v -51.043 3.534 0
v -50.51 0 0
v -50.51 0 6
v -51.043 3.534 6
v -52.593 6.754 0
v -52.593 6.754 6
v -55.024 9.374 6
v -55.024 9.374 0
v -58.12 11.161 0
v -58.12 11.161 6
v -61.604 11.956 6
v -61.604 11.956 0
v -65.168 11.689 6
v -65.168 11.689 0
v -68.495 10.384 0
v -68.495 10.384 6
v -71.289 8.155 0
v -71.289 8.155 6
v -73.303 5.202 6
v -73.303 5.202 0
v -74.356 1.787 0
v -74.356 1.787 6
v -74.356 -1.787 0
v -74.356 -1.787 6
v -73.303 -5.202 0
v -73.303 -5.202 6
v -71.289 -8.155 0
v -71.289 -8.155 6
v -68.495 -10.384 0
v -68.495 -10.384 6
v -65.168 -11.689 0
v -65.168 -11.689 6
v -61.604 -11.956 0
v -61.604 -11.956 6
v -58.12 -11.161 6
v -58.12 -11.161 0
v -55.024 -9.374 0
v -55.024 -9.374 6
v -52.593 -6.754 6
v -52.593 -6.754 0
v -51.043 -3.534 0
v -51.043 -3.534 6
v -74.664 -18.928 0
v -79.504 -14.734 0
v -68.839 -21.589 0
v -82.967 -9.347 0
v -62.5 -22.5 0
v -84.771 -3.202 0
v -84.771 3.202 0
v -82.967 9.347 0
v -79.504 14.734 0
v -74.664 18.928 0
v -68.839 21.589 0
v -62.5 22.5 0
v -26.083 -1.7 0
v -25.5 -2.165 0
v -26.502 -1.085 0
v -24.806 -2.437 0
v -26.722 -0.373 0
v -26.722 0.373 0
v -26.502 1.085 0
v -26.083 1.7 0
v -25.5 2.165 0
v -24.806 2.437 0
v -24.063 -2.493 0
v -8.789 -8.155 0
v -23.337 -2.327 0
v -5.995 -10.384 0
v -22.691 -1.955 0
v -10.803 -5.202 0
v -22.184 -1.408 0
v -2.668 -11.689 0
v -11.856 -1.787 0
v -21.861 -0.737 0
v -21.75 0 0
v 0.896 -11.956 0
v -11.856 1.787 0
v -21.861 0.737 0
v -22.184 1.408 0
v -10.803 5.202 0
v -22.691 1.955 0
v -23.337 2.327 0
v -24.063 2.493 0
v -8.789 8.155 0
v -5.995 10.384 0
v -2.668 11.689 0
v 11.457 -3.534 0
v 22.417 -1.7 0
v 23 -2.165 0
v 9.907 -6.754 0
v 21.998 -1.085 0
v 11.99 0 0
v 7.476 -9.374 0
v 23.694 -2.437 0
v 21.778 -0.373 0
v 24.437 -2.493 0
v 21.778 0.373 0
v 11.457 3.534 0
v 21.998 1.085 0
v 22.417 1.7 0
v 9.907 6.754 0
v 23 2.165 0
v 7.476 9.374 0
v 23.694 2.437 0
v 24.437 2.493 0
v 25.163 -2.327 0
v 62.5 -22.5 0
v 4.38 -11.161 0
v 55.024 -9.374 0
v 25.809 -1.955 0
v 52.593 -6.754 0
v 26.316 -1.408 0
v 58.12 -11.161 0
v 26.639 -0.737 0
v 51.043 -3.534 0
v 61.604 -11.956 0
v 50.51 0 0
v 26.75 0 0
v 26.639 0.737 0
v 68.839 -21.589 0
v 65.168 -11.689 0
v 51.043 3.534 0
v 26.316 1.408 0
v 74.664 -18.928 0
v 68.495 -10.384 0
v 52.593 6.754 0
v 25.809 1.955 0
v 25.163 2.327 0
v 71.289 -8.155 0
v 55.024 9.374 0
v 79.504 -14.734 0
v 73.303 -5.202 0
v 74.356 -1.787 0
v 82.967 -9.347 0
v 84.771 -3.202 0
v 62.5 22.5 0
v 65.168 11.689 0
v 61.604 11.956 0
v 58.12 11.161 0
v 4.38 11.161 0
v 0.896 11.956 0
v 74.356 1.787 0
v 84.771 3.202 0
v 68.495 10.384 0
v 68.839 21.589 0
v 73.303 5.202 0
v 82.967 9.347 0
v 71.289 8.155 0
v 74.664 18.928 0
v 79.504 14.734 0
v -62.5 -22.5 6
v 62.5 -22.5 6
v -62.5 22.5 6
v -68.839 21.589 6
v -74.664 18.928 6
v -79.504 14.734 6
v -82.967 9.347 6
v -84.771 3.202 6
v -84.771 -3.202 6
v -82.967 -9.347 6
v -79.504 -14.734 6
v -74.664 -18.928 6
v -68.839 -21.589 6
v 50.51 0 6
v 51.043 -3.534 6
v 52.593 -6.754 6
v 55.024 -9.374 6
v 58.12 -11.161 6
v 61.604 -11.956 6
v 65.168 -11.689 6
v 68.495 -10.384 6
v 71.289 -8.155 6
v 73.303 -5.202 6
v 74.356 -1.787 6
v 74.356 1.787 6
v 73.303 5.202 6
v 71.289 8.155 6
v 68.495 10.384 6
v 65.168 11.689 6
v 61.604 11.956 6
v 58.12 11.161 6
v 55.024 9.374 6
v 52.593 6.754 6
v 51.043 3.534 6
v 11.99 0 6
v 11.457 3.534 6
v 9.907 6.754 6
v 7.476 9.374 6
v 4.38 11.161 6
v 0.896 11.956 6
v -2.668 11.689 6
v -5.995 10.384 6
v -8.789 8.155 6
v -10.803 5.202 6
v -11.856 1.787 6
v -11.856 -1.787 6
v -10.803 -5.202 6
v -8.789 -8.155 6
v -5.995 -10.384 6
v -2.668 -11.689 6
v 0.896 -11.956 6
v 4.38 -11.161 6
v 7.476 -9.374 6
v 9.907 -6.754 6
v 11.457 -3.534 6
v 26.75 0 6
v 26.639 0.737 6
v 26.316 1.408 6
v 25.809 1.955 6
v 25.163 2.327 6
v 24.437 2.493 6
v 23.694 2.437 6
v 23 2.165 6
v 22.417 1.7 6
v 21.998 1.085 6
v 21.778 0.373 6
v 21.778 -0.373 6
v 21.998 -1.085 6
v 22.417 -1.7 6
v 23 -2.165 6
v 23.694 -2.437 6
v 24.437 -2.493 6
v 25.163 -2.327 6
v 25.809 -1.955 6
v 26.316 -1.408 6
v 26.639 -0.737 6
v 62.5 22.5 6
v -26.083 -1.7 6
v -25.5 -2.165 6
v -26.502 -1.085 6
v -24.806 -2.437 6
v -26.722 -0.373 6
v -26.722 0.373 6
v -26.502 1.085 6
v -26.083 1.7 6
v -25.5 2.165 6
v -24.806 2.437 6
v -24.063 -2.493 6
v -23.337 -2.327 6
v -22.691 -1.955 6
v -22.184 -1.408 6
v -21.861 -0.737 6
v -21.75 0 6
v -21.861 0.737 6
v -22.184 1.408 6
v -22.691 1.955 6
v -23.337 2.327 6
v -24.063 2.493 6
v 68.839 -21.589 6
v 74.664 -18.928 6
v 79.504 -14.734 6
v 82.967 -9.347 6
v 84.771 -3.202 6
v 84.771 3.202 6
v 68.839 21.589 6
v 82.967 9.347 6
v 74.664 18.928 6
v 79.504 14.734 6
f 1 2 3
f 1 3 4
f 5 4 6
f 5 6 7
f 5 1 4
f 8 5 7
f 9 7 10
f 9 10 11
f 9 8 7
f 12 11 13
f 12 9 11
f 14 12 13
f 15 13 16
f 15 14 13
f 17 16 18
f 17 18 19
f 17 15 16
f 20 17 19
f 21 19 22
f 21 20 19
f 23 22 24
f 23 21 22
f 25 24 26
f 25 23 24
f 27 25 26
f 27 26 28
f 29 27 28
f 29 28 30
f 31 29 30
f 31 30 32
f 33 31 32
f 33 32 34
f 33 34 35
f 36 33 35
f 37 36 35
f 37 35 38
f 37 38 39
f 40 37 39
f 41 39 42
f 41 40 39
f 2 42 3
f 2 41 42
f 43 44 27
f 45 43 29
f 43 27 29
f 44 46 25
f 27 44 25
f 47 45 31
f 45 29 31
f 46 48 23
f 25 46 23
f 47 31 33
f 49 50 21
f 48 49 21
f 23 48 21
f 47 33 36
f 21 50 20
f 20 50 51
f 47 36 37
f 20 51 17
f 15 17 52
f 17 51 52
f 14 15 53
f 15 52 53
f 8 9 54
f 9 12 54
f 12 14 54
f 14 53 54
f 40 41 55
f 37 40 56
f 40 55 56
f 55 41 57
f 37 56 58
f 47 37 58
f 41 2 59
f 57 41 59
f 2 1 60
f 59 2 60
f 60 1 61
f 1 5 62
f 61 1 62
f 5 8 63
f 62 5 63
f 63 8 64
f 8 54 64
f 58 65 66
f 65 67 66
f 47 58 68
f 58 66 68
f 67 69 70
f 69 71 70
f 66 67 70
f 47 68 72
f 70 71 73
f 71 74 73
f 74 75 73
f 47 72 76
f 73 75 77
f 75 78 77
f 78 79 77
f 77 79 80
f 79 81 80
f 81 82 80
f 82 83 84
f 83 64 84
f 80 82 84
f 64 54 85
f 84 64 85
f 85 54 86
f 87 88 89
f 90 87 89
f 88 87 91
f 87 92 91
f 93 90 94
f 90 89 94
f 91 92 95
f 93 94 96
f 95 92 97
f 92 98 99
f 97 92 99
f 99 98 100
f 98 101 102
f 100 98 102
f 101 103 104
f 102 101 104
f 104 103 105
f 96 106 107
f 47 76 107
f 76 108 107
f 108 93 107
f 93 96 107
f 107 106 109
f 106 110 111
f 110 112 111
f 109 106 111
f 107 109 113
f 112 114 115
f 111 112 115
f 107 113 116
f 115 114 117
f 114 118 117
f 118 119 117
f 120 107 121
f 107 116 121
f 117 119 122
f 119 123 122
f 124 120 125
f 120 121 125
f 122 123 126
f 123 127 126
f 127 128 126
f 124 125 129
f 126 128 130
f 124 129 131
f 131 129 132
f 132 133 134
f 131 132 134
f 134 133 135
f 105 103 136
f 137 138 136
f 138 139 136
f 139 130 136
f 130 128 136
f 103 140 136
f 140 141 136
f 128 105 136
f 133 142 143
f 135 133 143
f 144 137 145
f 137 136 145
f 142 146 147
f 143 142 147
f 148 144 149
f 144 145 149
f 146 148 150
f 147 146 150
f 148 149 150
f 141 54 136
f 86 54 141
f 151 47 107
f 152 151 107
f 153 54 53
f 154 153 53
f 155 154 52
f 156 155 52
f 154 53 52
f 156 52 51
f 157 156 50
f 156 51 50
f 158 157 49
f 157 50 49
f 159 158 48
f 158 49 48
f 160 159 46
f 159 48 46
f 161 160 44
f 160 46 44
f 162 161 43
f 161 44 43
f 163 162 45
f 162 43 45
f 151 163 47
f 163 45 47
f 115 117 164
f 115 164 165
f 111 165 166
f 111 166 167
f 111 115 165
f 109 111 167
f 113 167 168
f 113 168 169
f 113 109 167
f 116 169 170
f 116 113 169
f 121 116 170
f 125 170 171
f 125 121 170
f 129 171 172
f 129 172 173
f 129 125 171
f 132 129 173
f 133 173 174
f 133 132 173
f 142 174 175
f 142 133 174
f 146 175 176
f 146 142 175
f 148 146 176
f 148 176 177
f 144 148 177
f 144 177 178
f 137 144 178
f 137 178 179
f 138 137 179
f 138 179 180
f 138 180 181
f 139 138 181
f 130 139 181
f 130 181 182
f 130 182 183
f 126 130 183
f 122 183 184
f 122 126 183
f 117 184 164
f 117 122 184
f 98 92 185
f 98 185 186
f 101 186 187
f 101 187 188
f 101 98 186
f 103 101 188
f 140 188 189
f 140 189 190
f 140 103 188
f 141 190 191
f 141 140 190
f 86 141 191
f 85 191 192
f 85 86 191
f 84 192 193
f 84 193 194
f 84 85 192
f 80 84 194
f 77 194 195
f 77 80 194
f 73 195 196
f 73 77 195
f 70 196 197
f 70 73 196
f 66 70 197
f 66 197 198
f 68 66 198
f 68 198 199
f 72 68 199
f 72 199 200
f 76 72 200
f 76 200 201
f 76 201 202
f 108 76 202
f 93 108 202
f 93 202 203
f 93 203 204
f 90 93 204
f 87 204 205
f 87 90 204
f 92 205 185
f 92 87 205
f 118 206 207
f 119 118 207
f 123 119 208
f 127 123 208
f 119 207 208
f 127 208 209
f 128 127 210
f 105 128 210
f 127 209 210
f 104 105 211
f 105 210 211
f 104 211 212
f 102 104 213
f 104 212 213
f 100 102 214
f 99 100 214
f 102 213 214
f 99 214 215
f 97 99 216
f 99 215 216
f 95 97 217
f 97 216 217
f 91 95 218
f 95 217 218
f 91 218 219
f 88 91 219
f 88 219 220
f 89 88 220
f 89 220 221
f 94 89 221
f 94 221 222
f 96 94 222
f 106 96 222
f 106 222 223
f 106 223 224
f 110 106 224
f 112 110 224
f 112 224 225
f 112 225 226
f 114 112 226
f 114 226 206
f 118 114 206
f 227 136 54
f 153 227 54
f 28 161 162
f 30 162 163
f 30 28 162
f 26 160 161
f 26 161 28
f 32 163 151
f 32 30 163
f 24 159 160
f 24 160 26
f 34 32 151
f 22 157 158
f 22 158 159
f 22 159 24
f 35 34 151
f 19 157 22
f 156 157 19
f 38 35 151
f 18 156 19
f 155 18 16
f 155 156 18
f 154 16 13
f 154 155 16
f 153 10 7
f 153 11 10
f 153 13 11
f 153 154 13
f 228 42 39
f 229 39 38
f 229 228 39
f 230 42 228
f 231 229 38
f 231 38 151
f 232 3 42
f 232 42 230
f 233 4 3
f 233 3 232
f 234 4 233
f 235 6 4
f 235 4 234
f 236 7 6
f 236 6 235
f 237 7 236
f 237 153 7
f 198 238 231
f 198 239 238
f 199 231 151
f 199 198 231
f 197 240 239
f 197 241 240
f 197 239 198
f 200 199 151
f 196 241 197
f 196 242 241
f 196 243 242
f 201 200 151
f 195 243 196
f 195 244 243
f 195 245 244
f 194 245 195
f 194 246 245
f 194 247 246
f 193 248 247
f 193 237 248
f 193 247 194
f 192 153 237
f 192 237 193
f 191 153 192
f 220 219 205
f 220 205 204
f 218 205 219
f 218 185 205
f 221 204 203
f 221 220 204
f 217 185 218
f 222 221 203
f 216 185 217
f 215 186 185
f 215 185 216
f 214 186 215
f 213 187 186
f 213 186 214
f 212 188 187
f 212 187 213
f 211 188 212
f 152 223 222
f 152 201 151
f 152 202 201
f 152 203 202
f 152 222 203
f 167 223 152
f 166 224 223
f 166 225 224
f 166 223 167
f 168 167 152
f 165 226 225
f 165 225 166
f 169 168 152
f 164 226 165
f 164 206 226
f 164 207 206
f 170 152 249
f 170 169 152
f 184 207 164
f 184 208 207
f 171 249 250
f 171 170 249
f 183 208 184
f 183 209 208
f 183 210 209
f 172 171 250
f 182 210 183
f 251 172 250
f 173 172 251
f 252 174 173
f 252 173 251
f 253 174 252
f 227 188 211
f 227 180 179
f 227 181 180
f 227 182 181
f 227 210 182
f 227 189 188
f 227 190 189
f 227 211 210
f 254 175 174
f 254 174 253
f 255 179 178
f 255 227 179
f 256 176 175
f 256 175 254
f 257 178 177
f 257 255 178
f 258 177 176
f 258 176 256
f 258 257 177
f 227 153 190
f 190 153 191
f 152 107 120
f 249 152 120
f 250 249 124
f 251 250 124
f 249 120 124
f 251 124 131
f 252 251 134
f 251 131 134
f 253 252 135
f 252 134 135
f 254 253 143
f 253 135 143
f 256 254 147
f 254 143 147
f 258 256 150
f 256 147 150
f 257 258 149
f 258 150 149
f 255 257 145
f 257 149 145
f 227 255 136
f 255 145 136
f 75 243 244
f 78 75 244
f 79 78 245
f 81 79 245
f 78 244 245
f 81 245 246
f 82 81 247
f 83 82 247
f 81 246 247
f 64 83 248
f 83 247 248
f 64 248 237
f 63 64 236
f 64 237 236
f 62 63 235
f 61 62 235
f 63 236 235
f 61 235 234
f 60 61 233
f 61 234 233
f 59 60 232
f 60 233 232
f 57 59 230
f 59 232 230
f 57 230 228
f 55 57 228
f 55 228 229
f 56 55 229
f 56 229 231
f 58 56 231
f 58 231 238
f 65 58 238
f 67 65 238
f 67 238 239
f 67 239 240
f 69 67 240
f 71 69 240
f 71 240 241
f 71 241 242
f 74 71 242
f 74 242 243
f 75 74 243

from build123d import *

# Parameters (mm, degrees)
SKETCH2_R           = 11.99
BOSS_EXTRUDE1_DEPTH = 6
SKETCH3_R           = 2.5
CUT_EXTRUDE1_DEPTH  = 10


with BuildPart() as part:
    # Sketch2 → Boss-Extrude1 (new body)
    with BuildSketch(Plane.XY):
        with BuildLine():
            Line((-62.5, -22.5), (62.5, -22.5))
            ThreePointArc((62.5, -22.5), (85, 0), (62.5, 22.5))
            Line((62.5, 22.5), (-62.5, 22.5))
            ThreePointArc((-62.5, 22.5), (-85, 0), (-62.5, -22.5))
        make_face()
        with Locations((-62.5, 0)):
            Circle(SKETCH2_R, mode=Mode.SUBTRACT)
        with Locations(Location((62.5, 0, 0), (0, 0, 180))):
            Circle(SKETCH2_R, mode=Mode.SUBTRACT)
        Circle(SKETCH2_R, mode=Mode.SUBTRACT)
    extrude(amount=BOSS_EXTRUDE1_DEPTH)

    # Sketch3 → Cut-Extrude1 (cut)
    with BuildSketch(Plane.XY.offset(6)):
        with Locations((-24.25, 0)):
            Circle(SKETCH3_R)
        with Locations((24.25, 0)):
            Circle(SKETCH3_R)
    extrude(amount=-CUT_EXTRUDE1_DEPTH, mode=Mode.SUBTRACT)


solid = part.part
